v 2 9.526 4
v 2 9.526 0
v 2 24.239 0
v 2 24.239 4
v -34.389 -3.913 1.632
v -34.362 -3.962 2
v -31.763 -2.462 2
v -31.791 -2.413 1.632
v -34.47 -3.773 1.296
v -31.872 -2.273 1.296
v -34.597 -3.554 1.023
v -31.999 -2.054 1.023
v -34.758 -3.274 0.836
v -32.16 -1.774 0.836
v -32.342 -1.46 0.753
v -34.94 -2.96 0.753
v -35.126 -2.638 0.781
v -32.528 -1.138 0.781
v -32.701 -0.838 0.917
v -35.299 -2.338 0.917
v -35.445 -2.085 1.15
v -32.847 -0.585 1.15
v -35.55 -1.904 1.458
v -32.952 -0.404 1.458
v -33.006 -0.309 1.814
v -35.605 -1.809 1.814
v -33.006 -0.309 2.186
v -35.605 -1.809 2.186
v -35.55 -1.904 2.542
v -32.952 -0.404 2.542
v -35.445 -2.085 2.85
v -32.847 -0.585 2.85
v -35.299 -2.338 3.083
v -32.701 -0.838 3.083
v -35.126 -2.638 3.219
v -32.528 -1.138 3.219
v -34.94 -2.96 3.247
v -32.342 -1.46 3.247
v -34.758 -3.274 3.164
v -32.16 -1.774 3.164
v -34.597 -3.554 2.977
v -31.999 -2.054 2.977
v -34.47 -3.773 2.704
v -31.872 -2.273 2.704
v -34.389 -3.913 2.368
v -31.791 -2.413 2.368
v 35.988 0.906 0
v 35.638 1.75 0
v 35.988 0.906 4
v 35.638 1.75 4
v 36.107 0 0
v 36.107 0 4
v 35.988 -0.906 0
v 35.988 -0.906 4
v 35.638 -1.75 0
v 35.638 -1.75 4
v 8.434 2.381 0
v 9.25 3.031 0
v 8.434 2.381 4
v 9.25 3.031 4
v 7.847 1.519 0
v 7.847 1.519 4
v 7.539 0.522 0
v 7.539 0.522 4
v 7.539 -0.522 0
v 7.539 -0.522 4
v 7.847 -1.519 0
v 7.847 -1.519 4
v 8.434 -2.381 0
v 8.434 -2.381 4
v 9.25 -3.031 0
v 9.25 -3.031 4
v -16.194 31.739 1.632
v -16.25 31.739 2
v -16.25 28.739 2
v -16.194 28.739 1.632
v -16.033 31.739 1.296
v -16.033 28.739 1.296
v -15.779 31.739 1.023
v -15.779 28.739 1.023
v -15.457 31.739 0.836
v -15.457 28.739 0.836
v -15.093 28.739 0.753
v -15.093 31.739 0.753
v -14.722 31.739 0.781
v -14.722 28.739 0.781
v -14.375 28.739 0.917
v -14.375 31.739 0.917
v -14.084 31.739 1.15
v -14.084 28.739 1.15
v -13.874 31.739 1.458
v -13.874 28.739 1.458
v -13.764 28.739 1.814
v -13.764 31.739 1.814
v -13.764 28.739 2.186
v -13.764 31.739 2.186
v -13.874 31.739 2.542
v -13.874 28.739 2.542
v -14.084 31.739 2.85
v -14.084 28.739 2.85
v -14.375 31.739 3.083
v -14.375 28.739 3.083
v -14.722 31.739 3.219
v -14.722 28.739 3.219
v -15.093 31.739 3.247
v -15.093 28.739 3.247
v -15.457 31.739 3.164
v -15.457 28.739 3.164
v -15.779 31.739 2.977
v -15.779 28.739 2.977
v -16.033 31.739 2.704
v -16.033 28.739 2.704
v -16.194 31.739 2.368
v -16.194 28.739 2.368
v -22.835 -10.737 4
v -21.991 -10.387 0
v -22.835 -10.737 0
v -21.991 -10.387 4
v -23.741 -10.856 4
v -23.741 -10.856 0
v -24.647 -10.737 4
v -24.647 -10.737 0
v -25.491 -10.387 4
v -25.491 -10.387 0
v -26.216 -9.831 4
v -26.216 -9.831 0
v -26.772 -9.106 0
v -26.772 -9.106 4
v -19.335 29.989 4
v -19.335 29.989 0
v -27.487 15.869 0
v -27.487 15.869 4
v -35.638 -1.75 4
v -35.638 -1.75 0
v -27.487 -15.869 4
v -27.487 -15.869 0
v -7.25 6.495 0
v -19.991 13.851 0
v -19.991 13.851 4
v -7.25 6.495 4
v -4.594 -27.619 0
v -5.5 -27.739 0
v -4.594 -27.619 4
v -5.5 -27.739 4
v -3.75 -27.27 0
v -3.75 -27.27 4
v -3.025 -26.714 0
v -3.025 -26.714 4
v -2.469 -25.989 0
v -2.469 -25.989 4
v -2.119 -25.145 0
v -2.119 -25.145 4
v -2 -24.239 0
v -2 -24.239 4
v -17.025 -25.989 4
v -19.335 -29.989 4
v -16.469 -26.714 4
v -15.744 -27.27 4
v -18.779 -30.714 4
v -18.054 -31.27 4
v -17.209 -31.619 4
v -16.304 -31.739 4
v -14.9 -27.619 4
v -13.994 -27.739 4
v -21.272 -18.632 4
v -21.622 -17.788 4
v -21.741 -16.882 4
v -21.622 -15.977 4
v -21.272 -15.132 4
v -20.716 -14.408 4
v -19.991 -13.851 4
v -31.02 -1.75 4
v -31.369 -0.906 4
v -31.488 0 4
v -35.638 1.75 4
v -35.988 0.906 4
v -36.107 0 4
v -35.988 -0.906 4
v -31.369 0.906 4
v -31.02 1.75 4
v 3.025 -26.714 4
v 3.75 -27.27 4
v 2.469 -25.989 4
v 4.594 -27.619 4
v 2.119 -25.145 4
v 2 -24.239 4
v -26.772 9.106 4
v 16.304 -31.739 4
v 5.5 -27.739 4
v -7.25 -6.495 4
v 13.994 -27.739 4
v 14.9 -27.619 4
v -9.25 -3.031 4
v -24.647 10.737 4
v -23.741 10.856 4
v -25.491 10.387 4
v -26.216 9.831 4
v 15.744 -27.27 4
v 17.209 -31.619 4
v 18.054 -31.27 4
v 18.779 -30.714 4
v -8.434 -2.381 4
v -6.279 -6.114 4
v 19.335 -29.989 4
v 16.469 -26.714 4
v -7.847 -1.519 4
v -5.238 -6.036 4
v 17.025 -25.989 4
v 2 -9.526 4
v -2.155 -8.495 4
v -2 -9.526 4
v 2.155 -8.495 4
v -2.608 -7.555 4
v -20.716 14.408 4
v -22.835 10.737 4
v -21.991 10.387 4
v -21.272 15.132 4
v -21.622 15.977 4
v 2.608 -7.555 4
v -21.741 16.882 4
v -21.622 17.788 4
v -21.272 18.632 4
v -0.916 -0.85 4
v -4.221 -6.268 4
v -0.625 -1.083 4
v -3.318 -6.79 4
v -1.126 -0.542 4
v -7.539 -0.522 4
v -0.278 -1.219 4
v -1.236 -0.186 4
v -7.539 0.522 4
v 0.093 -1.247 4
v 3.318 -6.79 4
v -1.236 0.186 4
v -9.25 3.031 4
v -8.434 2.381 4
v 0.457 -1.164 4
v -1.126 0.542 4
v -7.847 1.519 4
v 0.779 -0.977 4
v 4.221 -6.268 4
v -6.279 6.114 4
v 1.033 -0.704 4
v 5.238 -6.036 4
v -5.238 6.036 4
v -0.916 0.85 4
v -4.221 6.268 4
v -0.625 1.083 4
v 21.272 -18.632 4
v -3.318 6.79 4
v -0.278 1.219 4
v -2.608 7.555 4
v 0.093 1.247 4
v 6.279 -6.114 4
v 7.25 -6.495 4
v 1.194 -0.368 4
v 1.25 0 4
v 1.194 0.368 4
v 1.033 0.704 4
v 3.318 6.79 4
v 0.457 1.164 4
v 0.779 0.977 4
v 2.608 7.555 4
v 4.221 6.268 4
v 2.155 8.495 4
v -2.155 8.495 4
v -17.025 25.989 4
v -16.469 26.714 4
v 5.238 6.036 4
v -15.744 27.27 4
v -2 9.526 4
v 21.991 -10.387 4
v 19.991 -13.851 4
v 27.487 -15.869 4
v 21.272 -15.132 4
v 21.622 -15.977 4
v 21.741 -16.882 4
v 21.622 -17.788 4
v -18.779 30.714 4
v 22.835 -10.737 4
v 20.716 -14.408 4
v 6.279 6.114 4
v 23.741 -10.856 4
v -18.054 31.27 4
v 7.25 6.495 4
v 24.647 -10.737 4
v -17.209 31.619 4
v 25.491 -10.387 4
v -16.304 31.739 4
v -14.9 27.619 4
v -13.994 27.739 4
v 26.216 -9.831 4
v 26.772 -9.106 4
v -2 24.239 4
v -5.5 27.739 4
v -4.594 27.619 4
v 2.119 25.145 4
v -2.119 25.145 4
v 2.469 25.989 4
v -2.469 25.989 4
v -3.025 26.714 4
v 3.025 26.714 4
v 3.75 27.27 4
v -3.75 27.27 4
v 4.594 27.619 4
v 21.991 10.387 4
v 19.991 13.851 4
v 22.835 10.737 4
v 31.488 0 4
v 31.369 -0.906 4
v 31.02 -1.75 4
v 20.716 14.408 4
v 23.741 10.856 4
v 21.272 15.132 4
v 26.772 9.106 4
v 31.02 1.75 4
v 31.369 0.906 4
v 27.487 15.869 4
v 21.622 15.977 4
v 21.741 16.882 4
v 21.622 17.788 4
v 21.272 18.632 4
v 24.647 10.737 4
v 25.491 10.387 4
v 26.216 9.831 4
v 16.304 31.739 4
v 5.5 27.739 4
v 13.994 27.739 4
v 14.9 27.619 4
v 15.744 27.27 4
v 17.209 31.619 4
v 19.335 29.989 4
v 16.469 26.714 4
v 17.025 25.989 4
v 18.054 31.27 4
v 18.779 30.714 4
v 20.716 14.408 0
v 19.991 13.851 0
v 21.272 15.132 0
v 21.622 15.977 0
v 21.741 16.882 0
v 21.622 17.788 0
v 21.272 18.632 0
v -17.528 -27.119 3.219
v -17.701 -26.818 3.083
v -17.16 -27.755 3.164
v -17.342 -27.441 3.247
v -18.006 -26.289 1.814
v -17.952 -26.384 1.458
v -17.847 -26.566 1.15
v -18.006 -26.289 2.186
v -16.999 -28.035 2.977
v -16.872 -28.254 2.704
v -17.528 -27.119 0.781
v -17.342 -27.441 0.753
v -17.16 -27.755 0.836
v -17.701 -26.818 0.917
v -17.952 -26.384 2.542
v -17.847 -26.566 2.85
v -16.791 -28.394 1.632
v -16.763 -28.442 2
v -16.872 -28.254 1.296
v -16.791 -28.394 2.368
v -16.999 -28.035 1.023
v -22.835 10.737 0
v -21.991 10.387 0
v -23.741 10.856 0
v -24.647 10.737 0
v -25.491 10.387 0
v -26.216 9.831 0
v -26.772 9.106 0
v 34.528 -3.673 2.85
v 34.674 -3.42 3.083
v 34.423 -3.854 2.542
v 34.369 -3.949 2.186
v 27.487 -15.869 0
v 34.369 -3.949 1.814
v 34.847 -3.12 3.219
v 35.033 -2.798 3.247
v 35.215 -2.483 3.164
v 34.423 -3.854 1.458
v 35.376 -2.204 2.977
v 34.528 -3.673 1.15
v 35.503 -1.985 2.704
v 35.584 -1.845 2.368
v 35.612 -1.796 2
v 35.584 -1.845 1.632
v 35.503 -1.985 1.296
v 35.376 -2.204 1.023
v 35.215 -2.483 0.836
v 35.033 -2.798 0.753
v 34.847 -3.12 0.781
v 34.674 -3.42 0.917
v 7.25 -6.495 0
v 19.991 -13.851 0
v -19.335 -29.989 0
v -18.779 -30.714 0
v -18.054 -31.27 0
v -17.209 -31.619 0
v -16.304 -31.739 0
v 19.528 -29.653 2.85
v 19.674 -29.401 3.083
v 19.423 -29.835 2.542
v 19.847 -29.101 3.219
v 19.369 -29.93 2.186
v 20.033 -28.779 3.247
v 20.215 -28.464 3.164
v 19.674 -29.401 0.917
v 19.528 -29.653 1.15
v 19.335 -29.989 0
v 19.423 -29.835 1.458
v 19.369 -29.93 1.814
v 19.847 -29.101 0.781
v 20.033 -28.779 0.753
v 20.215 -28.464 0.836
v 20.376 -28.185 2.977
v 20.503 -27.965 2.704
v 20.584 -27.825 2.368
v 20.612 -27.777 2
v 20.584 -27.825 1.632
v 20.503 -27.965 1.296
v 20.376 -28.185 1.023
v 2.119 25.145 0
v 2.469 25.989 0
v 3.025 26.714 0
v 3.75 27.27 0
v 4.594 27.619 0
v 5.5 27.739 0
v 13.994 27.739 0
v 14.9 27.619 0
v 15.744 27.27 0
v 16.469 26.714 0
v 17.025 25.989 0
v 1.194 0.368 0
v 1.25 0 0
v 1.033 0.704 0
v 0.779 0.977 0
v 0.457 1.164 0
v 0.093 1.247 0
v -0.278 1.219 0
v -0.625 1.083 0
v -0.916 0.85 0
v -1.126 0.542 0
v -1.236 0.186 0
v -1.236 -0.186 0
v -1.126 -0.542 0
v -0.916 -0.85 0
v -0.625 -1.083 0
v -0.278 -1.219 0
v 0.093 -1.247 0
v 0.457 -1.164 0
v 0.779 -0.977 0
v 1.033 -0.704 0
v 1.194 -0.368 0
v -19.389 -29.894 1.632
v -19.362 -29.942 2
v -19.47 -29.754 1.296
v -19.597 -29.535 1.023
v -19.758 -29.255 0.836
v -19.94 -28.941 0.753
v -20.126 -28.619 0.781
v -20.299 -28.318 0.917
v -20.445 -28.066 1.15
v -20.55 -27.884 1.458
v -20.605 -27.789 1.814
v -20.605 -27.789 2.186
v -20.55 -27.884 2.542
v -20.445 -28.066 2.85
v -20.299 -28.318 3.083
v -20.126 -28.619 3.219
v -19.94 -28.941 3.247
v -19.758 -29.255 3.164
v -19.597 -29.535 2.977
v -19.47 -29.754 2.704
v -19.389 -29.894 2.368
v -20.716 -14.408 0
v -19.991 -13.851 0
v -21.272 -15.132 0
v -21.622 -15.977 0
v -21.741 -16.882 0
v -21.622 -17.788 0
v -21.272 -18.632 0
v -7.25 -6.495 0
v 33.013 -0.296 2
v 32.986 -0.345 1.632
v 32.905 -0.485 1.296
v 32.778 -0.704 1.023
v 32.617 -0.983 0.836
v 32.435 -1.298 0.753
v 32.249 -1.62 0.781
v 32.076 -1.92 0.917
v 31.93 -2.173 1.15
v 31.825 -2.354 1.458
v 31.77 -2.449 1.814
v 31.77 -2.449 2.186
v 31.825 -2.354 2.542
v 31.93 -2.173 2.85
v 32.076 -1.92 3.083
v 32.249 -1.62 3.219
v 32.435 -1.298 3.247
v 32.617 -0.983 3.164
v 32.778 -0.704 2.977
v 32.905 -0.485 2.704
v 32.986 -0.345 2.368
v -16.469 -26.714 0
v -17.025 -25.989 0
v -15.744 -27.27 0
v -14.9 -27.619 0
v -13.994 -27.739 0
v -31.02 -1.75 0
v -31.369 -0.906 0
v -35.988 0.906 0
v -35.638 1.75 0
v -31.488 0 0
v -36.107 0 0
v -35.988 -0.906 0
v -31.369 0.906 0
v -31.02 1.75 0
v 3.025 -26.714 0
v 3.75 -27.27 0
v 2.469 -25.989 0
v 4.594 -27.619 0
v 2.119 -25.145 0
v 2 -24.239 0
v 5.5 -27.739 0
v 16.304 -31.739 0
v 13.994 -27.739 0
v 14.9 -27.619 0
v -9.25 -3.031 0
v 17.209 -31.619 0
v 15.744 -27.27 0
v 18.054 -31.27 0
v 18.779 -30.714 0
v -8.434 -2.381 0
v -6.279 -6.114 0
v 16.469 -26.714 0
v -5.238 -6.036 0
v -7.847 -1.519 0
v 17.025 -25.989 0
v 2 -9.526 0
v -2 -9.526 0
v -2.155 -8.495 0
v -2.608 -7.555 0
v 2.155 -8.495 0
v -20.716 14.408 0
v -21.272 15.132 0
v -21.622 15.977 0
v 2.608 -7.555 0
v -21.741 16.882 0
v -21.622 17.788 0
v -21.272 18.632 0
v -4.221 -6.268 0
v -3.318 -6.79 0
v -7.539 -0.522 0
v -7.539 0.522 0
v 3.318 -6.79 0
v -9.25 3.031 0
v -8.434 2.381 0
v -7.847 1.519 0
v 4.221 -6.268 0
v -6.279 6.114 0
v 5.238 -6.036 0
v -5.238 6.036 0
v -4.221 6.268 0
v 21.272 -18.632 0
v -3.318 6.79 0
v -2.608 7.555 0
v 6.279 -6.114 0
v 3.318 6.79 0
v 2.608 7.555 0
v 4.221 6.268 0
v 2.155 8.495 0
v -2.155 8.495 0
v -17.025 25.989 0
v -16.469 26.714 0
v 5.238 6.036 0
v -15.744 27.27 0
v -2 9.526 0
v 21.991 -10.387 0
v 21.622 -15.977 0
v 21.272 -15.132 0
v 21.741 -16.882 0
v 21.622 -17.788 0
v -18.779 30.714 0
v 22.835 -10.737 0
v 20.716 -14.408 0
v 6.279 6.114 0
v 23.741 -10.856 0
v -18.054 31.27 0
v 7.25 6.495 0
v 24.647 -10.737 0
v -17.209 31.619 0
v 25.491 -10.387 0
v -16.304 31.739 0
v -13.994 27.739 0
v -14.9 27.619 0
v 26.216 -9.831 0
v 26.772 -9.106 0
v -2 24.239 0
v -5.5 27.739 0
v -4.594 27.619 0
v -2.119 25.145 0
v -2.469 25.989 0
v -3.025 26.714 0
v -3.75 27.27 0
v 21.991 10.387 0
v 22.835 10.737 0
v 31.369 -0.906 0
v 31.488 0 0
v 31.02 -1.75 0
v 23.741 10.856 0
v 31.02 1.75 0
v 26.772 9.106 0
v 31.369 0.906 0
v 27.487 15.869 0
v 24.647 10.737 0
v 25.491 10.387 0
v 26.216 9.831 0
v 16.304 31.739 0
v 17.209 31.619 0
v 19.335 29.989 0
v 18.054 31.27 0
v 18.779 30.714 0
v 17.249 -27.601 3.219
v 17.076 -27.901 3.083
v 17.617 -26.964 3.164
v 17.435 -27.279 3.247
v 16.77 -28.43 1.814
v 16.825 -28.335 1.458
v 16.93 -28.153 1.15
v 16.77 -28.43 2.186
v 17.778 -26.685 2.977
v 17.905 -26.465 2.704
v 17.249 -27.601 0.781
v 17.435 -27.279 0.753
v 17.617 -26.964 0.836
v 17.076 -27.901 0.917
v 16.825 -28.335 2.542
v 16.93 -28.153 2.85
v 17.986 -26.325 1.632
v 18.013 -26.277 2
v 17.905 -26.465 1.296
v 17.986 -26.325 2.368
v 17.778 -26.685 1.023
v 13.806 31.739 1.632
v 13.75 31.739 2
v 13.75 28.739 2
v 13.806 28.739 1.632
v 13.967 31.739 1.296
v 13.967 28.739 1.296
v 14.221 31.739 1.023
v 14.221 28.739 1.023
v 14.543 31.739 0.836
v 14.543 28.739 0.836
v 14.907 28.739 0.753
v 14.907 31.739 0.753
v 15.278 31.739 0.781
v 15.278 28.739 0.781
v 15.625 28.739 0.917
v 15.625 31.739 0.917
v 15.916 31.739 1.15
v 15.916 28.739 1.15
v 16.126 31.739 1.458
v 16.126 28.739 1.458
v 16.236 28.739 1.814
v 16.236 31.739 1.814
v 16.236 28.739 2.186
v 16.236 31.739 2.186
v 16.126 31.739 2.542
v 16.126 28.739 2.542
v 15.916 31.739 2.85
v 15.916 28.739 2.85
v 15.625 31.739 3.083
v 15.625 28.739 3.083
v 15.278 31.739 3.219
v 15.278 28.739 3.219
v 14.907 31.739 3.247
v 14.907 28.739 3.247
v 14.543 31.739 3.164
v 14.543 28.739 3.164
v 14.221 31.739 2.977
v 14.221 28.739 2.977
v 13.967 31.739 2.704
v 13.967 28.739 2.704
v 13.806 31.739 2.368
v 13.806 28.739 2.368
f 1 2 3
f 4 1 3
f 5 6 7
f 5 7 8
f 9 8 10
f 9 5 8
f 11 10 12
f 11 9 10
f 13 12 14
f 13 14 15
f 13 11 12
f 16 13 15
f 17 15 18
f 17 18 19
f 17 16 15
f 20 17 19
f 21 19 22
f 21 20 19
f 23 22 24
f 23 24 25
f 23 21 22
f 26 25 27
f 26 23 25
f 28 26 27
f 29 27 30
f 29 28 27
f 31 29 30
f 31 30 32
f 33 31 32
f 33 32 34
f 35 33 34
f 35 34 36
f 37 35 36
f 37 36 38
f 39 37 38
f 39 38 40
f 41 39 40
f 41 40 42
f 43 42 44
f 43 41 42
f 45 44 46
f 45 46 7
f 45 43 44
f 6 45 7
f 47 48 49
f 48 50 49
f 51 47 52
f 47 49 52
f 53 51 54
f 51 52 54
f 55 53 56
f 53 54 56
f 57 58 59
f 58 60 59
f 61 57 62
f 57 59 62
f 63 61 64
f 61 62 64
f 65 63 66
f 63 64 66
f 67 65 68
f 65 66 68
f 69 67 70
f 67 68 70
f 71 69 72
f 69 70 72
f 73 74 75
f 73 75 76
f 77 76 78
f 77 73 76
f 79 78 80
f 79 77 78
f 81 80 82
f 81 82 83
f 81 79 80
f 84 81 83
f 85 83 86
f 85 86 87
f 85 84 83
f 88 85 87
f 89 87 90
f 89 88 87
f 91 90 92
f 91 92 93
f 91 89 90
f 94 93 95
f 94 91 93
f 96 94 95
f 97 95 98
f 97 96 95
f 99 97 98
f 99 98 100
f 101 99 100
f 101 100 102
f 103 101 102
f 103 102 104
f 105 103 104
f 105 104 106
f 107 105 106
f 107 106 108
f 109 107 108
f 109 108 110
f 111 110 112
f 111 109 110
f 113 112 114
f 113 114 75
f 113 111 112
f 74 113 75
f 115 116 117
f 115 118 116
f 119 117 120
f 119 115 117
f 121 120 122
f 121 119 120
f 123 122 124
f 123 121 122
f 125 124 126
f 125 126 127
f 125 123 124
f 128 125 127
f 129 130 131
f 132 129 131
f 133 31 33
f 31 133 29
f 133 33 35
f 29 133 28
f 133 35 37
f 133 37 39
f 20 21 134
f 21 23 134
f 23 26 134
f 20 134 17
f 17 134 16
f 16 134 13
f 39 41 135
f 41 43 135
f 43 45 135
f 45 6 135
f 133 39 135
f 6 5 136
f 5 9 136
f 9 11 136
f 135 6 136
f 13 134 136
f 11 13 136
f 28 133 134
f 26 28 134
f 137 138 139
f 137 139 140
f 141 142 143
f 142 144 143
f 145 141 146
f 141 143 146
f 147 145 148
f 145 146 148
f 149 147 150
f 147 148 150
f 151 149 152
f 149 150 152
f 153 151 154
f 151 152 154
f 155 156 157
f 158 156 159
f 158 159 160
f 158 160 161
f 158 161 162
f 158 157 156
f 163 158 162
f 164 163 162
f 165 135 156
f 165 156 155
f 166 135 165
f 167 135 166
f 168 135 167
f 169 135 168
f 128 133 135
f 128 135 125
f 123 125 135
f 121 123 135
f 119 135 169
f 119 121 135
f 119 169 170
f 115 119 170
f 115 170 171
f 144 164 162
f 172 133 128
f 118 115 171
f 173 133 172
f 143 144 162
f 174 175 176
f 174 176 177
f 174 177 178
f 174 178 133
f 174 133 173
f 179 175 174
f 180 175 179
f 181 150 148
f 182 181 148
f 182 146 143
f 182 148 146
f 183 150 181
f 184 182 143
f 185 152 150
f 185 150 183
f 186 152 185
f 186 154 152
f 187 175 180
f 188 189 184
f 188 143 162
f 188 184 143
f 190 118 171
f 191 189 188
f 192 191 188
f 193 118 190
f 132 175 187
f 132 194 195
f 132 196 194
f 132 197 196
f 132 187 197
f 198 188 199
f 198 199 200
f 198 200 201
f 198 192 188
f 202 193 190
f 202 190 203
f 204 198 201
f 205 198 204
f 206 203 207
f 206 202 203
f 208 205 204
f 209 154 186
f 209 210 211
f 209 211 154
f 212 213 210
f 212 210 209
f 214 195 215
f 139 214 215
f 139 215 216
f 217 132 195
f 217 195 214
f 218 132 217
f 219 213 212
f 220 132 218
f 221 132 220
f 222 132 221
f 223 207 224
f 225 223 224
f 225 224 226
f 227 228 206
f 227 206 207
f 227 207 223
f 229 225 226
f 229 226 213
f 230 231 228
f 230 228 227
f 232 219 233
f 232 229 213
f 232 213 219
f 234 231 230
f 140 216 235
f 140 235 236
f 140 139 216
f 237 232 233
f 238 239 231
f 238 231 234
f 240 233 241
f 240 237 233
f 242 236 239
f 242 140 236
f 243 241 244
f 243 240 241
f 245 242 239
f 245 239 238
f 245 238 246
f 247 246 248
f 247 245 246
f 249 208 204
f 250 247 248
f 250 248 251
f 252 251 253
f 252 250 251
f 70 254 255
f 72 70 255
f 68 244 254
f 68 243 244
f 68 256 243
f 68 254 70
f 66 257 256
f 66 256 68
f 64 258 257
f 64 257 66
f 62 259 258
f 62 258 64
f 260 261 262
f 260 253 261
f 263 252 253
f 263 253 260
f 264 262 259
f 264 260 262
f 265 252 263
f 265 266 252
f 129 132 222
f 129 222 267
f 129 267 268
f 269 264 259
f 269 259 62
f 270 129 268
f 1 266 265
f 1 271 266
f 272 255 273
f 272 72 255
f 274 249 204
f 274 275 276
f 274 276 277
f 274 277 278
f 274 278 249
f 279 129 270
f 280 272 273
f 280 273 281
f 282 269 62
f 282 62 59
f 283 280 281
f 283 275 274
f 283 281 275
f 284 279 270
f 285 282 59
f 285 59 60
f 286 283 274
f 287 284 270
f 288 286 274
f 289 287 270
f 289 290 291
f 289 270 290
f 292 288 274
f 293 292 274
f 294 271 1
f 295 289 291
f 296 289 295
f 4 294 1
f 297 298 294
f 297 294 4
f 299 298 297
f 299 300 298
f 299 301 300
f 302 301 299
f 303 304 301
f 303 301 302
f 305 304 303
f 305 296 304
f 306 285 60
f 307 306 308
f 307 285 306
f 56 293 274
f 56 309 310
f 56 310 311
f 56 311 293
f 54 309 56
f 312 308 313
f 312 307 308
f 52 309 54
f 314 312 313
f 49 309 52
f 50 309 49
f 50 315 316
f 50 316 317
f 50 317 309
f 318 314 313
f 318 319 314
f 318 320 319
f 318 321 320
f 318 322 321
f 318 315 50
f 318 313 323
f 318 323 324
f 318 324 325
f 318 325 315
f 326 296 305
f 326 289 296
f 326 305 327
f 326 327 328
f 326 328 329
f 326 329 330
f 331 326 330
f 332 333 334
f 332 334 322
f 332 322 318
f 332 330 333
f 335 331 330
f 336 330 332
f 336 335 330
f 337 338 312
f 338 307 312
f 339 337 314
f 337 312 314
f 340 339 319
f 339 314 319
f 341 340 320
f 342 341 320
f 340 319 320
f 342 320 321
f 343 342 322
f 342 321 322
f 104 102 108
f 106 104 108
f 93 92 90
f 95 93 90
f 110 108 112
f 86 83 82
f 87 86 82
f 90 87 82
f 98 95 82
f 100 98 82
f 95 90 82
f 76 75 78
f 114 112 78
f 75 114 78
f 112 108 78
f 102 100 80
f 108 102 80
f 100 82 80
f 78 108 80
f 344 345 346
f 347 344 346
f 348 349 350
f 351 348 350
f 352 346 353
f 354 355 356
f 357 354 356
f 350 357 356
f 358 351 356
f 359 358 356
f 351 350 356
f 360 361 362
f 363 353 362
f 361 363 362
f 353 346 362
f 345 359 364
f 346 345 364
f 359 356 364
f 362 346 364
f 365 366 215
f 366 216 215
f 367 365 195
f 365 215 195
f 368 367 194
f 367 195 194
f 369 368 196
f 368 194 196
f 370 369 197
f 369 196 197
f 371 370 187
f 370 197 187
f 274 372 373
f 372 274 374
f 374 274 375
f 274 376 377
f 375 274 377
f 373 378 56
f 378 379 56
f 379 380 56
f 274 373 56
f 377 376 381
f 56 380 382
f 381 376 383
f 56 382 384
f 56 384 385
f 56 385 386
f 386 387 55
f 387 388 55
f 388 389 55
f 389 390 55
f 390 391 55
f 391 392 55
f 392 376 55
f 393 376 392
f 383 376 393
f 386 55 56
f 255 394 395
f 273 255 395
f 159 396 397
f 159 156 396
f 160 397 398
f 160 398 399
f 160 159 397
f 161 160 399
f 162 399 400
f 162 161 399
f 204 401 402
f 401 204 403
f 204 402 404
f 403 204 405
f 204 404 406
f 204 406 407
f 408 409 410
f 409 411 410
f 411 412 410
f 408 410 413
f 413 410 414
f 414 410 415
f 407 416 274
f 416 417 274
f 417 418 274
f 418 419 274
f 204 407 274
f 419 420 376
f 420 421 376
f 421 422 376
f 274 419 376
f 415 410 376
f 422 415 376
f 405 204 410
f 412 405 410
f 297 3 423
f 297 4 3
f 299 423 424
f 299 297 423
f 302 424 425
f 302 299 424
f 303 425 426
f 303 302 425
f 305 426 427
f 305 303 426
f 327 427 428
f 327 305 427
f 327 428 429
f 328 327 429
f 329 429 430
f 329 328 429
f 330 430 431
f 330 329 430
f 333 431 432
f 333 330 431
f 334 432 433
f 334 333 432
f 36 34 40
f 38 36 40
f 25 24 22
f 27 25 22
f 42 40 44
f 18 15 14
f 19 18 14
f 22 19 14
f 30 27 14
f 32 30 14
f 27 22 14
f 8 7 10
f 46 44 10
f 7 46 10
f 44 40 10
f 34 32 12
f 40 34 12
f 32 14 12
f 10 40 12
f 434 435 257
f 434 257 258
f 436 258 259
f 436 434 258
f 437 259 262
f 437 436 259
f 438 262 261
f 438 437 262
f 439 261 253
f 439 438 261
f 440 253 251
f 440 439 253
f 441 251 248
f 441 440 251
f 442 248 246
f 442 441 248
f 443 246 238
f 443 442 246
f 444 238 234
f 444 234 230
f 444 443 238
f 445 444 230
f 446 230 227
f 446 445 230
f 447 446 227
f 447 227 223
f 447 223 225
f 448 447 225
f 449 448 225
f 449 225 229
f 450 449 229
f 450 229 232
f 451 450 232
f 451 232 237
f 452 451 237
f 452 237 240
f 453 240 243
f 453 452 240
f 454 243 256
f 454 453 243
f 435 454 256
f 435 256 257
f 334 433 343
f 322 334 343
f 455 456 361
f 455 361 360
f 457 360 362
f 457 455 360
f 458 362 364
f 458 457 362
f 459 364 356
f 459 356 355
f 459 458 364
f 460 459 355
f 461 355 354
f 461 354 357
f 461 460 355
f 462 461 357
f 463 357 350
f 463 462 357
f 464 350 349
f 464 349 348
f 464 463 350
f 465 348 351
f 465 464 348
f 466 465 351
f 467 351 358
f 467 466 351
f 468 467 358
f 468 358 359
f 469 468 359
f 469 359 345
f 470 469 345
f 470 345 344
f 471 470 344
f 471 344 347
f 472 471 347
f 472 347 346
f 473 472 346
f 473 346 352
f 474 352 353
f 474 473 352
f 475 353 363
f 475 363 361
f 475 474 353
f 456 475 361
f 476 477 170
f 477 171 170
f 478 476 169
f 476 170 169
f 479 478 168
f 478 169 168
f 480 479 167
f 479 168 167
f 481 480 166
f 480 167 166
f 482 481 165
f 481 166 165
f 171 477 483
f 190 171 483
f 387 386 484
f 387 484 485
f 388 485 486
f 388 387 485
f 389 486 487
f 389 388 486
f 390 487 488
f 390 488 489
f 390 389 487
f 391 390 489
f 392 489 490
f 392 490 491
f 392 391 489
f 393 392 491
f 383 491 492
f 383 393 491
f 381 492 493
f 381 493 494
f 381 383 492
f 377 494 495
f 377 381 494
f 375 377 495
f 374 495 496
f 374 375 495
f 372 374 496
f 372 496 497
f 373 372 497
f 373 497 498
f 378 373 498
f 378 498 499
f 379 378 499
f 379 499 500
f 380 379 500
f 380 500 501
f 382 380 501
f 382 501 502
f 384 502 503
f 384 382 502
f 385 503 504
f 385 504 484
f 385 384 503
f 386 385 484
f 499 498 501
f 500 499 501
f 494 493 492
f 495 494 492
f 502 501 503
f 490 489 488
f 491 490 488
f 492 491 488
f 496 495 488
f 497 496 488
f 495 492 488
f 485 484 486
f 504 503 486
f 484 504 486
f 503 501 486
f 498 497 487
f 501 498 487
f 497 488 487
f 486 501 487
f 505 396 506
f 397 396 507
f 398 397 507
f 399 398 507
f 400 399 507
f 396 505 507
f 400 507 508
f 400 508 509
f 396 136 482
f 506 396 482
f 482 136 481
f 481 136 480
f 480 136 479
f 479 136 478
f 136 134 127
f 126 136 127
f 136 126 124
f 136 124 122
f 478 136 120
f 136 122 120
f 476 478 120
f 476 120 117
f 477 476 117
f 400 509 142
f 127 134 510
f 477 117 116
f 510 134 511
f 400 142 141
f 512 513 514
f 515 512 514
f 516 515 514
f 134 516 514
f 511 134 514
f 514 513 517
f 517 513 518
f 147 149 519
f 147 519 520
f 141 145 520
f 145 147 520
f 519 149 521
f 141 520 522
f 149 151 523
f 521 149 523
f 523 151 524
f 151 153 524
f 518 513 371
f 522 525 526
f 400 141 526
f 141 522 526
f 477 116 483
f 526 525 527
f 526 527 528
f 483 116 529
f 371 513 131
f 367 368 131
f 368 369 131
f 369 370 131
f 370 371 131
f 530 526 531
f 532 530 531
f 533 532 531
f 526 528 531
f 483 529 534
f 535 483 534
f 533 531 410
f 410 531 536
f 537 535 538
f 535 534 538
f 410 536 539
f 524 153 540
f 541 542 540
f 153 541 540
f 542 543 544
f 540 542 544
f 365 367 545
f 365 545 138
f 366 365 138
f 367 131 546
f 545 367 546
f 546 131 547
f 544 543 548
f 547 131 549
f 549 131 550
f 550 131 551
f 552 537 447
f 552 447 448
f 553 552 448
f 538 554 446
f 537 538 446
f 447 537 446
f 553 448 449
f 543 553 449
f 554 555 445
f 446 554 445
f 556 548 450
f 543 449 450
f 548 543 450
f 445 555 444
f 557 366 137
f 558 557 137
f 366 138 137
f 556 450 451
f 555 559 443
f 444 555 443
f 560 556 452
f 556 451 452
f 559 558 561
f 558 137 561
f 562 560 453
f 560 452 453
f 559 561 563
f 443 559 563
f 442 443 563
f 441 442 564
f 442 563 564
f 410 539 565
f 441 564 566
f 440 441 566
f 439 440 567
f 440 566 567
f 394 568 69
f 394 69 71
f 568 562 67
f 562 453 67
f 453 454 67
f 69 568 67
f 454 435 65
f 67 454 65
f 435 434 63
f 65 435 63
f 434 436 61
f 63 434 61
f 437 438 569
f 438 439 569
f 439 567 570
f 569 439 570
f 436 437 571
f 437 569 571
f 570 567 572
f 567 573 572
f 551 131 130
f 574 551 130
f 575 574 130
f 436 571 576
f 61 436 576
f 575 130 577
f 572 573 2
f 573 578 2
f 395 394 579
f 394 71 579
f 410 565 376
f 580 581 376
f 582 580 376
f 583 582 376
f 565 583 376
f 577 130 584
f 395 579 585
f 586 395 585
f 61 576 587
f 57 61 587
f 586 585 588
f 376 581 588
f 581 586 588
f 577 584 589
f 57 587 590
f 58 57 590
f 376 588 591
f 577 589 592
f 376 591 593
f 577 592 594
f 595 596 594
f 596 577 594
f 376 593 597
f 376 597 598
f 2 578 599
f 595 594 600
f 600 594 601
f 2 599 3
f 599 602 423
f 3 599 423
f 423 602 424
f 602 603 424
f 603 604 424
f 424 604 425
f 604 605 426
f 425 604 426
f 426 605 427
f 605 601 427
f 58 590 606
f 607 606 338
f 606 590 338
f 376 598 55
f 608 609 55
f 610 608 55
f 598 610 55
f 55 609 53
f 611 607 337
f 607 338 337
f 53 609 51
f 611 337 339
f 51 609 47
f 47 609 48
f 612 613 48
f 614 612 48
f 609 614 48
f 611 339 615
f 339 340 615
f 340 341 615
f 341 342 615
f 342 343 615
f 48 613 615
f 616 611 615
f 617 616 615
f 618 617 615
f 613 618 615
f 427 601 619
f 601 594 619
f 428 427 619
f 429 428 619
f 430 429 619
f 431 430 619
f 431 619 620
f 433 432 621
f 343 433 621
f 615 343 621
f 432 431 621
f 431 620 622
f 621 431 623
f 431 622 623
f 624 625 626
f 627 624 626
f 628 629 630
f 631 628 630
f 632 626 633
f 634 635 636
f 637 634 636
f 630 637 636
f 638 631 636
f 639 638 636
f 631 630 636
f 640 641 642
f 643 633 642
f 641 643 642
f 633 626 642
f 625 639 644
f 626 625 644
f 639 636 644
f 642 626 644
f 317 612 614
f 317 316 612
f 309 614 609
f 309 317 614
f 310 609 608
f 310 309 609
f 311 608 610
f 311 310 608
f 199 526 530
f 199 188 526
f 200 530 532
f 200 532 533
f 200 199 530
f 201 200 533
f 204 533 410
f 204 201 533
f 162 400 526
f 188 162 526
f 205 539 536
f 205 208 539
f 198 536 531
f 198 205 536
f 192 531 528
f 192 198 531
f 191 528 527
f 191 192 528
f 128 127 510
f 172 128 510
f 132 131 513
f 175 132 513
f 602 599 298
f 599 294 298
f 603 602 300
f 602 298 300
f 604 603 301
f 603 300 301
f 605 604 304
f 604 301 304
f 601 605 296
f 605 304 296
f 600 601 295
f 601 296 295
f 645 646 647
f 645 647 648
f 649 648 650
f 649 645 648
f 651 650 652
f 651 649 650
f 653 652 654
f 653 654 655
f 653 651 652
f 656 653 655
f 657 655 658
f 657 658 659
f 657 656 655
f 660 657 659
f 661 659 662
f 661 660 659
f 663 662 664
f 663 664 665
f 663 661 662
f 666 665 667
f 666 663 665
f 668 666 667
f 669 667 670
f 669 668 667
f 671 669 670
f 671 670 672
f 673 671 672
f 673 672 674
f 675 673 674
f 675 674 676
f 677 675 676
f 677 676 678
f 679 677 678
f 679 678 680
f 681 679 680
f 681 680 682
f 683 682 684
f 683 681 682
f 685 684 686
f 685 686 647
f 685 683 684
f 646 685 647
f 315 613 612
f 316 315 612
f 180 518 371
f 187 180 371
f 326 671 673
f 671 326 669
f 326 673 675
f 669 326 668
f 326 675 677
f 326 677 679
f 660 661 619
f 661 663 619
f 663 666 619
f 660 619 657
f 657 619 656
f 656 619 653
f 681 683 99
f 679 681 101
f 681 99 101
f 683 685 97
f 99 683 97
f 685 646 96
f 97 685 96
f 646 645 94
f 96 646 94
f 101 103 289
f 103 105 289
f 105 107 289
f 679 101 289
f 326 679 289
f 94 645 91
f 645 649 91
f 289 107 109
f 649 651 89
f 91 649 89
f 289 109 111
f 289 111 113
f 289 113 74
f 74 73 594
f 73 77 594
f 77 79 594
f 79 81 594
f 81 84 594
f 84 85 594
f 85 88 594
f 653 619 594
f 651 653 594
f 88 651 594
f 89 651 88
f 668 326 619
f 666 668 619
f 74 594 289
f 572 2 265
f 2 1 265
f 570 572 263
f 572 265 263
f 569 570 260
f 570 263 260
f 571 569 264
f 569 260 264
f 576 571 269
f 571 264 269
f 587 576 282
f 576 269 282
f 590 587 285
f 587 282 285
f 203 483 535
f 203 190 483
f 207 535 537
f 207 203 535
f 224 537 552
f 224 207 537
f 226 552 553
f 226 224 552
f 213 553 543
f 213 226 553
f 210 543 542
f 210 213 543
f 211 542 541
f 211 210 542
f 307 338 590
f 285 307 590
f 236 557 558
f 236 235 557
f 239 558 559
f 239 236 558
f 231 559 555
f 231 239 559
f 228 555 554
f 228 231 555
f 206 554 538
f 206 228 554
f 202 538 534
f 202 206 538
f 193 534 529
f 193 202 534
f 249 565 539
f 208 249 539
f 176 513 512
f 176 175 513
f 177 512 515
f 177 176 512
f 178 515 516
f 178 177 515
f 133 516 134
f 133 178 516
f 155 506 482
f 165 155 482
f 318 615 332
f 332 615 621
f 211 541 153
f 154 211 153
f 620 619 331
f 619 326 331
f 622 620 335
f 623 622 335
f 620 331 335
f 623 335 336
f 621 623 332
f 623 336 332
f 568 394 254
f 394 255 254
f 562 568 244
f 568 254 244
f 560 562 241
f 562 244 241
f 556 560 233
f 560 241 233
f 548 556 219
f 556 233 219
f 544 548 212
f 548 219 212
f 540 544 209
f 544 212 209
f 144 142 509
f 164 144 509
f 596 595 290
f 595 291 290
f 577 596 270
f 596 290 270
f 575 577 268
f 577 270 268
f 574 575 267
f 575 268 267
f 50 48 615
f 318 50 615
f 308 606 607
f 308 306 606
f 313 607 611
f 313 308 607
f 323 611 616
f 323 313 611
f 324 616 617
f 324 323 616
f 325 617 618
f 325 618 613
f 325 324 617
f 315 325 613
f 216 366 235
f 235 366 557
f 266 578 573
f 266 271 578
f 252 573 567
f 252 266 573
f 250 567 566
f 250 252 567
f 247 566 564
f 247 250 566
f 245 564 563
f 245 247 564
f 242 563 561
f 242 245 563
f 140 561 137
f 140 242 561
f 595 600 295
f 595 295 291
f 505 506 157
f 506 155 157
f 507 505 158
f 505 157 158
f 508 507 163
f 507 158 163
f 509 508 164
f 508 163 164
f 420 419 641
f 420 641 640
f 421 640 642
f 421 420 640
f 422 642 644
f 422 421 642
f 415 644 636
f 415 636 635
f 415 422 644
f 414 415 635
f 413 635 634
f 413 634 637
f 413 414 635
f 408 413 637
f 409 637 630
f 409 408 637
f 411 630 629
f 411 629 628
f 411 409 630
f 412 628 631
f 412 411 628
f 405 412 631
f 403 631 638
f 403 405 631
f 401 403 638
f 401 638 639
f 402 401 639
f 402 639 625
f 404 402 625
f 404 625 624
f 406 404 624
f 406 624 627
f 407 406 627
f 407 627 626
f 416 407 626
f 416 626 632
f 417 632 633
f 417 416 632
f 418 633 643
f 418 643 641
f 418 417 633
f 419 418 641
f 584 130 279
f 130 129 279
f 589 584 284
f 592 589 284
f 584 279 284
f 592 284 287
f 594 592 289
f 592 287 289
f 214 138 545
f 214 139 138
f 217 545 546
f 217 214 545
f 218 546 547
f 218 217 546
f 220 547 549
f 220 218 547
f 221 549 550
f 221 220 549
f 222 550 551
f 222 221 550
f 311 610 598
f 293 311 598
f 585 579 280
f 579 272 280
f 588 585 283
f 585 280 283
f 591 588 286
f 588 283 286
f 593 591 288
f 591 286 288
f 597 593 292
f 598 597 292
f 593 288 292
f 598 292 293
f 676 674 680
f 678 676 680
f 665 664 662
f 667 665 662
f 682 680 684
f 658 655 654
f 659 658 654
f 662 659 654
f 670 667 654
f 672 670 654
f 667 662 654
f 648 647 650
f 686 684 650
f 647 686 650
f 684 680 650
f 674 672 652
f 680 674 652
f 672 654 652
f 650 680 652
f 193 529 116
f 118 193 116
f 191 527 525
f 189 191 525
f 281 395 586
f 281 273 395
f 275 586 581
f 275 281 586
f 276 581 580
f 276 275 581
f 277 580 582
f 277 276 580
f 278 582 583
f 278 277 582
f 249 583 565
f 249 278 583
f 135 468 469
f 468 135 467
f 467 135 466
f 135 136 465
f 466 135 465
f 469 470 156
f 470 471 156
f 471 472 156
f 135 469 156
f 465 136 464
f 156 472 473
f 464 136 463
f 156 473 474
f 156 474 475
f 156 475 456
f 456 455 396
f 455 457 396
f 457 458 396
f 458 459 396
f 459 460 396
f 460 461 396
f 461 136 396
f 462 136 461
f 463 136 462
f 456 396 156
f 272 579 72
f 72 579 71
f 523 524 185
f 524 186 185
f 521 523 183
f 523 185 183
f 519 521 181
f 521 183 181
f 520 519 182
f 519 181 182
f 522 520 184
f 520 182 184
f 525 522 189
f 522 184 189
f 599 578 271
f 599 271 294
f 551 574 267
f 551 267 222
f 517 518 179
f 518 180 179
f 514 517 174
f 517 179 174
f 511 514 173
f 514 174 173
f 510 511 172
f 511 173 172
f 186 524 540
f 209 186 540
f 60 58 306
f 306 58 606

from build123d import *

# Parameters (mm, degrees)
SKETCH1_R              = 1.25
BOSS_EXTRUDE4_DEPTH    = 4
FILLET1_R              = 3.5
CUT_EXTRUDE1_START     = -31.73871501
CUT_EXTRUDE1_OUTLINE_R = 1.25
CUT_EXTRUDE1_DEPTH     = 3
CIRPATTERN1_COUNT      = 3


# Read off the part's stored shape, not the designer's step: Cut-Extrude1
with BuildPart() as part:
    # Sketch1 (on Front Plane) → Boss-Extrude4 (new body)
    with BuildSketch(Plane.XY):
        Polygon((0, 31.73871501), (-18.324355655, 31.73871501), (-27.486533482, 15.869357505), (-36.64871131, 0), (-27.486533482, -15.869357505), (-18.324355655, -31.73871501), (0, -31.73871501), (18.324355655, -31.73871501), (27.486533482, -15.869357505), (36.64871131, 0), (27.486533482, 15.869357505), (18.324355655, 31.73871501), align=None)
        Circle(SKETCH1_R, mode=Mode.SUBTRACT)
        Polygon((-2, 3.464101615), (-2, 27.73871501), (-16.014954578, 27.73871501), (-23.022431867, 15.601408313), align=None, mode=Mode.SUBTRACT)
        Polygon((-4, 0), (-25.022431867, -12.137306697), (-32.029909156, 0), (-25.022431867, 12.137306697), align=None, mode=Mode.SUBTRACT)
        Polygon((2, 27.73871501), (16.014954578, 27.73871501), (23.022431867, 15.601408313), (2, 3.464101615), align=None, mode=Mode.SUBTRACT)
        Polygon((25.022431867, 12.137306697), (32.029909156, 0), (25.022431867, -12.137306697), (4, 0), align=None, mode=Mode.SUBTRACT)
        Polygon((23.022431867, -15.601408313), (16.014954578, -27.73871501), (2, -27.73871501), (2, -3.464101615), align=None, mode=Mode.SUBTRACT)
        Polygon((-2, -3.464101615), (-2, -27.73871501), (-16.014954578, -27.73871501), (-23.022431867, -15.601408313), align=None, mode=Mode.SUBTRACT)
    extrude(amount=BOSS_EXTRUDE4_DEPTH)

    # Fillet1
    fillet1_edges = [part.edges().sort_by_distance(p)[0] for p in [
        (2, -27.73871501, 2),
        (16.014954578, -27.73871501, 2),
        (23.022431867, -15.601408313, 2),
        (2, -3.464101615, 2),
        (18.324355655, 31.73871501, 2),
        (36.64871131, 0, 2),
        (18.324355655, -31.73871501, 2),
        (-18.324355655, -31.73871501, 2),
        (-36.64871131, 0, 2),
        (-18.324355655, 31.73871501, 2),
        (23.022431867, 15.601408313, 2),
        (16.014954578, 27.73871501, 2),
        (2, 27.73871501, 2),
        (2, 3.464101615, 2),
        (-16.014954578, 27.73871501, 2),
        (-23.022431867, 15.601408313, 2),
        (-2, 3.464101615, 2),
        (-2, 27.73871501, 2),
        (-25.022431867, 12.137306697, 2),
        (-32.029909156, 0, 2),
        (-25.022431867, -12.137306697, 2),
        (-4, 0, 2),
        (25.022431867, -12.137306697, 2),
        (32.029909156, 0, 2),
        (25.022431867, 12.137306697, 2),
        (4, 0, 2),
        (-2, -3.464101615, 2),
        (-23.022431867, -15.601408313, 2),
        (-16.014954578, -27.73871501, 2),
        (-2, -27.73871501, 2),
    ]]
    fillet(fillet1_edges, radius=FILLET1_R)

    # Cut-Extrude1 outline → Cut-Extrude1 (cut)
    with BuildSketch(Plane(origin=(0, 0, 0), x_dir=(0.49999999999999195, -0.8660254037844434, 0), z_dir=(0.8660254037844433, 0.4999999999999921, 0)).offset(CUT_EXTRUDE1_START)):
        with Locations((15, -2)):
            Circle(CUT_EXTRUDE1_OUTLINE_R)
        with Locations((-15, -2)):
            Circle(CUT_EXTRUDE1_OUTLINE_R)
    cut_extrude1 = extrude(amount=CUT_EXTRUDE1_DEPTH, mode=Mode.SUBTRACT)

    # CirPattern1: Cut-Extrude1 ×3 about axis
    cirpattern1_axis = Axis((0, 0, 0), (0, 0, -1))
    for i in range(1, CIRPATTERN1_COUNT):
        add(cut_extrude1.rotate(cirpattern1_axis, i * 360 / CIRPATTERN1_COUNT), mode=Mode.SUBTRACT)


solid = part.part
